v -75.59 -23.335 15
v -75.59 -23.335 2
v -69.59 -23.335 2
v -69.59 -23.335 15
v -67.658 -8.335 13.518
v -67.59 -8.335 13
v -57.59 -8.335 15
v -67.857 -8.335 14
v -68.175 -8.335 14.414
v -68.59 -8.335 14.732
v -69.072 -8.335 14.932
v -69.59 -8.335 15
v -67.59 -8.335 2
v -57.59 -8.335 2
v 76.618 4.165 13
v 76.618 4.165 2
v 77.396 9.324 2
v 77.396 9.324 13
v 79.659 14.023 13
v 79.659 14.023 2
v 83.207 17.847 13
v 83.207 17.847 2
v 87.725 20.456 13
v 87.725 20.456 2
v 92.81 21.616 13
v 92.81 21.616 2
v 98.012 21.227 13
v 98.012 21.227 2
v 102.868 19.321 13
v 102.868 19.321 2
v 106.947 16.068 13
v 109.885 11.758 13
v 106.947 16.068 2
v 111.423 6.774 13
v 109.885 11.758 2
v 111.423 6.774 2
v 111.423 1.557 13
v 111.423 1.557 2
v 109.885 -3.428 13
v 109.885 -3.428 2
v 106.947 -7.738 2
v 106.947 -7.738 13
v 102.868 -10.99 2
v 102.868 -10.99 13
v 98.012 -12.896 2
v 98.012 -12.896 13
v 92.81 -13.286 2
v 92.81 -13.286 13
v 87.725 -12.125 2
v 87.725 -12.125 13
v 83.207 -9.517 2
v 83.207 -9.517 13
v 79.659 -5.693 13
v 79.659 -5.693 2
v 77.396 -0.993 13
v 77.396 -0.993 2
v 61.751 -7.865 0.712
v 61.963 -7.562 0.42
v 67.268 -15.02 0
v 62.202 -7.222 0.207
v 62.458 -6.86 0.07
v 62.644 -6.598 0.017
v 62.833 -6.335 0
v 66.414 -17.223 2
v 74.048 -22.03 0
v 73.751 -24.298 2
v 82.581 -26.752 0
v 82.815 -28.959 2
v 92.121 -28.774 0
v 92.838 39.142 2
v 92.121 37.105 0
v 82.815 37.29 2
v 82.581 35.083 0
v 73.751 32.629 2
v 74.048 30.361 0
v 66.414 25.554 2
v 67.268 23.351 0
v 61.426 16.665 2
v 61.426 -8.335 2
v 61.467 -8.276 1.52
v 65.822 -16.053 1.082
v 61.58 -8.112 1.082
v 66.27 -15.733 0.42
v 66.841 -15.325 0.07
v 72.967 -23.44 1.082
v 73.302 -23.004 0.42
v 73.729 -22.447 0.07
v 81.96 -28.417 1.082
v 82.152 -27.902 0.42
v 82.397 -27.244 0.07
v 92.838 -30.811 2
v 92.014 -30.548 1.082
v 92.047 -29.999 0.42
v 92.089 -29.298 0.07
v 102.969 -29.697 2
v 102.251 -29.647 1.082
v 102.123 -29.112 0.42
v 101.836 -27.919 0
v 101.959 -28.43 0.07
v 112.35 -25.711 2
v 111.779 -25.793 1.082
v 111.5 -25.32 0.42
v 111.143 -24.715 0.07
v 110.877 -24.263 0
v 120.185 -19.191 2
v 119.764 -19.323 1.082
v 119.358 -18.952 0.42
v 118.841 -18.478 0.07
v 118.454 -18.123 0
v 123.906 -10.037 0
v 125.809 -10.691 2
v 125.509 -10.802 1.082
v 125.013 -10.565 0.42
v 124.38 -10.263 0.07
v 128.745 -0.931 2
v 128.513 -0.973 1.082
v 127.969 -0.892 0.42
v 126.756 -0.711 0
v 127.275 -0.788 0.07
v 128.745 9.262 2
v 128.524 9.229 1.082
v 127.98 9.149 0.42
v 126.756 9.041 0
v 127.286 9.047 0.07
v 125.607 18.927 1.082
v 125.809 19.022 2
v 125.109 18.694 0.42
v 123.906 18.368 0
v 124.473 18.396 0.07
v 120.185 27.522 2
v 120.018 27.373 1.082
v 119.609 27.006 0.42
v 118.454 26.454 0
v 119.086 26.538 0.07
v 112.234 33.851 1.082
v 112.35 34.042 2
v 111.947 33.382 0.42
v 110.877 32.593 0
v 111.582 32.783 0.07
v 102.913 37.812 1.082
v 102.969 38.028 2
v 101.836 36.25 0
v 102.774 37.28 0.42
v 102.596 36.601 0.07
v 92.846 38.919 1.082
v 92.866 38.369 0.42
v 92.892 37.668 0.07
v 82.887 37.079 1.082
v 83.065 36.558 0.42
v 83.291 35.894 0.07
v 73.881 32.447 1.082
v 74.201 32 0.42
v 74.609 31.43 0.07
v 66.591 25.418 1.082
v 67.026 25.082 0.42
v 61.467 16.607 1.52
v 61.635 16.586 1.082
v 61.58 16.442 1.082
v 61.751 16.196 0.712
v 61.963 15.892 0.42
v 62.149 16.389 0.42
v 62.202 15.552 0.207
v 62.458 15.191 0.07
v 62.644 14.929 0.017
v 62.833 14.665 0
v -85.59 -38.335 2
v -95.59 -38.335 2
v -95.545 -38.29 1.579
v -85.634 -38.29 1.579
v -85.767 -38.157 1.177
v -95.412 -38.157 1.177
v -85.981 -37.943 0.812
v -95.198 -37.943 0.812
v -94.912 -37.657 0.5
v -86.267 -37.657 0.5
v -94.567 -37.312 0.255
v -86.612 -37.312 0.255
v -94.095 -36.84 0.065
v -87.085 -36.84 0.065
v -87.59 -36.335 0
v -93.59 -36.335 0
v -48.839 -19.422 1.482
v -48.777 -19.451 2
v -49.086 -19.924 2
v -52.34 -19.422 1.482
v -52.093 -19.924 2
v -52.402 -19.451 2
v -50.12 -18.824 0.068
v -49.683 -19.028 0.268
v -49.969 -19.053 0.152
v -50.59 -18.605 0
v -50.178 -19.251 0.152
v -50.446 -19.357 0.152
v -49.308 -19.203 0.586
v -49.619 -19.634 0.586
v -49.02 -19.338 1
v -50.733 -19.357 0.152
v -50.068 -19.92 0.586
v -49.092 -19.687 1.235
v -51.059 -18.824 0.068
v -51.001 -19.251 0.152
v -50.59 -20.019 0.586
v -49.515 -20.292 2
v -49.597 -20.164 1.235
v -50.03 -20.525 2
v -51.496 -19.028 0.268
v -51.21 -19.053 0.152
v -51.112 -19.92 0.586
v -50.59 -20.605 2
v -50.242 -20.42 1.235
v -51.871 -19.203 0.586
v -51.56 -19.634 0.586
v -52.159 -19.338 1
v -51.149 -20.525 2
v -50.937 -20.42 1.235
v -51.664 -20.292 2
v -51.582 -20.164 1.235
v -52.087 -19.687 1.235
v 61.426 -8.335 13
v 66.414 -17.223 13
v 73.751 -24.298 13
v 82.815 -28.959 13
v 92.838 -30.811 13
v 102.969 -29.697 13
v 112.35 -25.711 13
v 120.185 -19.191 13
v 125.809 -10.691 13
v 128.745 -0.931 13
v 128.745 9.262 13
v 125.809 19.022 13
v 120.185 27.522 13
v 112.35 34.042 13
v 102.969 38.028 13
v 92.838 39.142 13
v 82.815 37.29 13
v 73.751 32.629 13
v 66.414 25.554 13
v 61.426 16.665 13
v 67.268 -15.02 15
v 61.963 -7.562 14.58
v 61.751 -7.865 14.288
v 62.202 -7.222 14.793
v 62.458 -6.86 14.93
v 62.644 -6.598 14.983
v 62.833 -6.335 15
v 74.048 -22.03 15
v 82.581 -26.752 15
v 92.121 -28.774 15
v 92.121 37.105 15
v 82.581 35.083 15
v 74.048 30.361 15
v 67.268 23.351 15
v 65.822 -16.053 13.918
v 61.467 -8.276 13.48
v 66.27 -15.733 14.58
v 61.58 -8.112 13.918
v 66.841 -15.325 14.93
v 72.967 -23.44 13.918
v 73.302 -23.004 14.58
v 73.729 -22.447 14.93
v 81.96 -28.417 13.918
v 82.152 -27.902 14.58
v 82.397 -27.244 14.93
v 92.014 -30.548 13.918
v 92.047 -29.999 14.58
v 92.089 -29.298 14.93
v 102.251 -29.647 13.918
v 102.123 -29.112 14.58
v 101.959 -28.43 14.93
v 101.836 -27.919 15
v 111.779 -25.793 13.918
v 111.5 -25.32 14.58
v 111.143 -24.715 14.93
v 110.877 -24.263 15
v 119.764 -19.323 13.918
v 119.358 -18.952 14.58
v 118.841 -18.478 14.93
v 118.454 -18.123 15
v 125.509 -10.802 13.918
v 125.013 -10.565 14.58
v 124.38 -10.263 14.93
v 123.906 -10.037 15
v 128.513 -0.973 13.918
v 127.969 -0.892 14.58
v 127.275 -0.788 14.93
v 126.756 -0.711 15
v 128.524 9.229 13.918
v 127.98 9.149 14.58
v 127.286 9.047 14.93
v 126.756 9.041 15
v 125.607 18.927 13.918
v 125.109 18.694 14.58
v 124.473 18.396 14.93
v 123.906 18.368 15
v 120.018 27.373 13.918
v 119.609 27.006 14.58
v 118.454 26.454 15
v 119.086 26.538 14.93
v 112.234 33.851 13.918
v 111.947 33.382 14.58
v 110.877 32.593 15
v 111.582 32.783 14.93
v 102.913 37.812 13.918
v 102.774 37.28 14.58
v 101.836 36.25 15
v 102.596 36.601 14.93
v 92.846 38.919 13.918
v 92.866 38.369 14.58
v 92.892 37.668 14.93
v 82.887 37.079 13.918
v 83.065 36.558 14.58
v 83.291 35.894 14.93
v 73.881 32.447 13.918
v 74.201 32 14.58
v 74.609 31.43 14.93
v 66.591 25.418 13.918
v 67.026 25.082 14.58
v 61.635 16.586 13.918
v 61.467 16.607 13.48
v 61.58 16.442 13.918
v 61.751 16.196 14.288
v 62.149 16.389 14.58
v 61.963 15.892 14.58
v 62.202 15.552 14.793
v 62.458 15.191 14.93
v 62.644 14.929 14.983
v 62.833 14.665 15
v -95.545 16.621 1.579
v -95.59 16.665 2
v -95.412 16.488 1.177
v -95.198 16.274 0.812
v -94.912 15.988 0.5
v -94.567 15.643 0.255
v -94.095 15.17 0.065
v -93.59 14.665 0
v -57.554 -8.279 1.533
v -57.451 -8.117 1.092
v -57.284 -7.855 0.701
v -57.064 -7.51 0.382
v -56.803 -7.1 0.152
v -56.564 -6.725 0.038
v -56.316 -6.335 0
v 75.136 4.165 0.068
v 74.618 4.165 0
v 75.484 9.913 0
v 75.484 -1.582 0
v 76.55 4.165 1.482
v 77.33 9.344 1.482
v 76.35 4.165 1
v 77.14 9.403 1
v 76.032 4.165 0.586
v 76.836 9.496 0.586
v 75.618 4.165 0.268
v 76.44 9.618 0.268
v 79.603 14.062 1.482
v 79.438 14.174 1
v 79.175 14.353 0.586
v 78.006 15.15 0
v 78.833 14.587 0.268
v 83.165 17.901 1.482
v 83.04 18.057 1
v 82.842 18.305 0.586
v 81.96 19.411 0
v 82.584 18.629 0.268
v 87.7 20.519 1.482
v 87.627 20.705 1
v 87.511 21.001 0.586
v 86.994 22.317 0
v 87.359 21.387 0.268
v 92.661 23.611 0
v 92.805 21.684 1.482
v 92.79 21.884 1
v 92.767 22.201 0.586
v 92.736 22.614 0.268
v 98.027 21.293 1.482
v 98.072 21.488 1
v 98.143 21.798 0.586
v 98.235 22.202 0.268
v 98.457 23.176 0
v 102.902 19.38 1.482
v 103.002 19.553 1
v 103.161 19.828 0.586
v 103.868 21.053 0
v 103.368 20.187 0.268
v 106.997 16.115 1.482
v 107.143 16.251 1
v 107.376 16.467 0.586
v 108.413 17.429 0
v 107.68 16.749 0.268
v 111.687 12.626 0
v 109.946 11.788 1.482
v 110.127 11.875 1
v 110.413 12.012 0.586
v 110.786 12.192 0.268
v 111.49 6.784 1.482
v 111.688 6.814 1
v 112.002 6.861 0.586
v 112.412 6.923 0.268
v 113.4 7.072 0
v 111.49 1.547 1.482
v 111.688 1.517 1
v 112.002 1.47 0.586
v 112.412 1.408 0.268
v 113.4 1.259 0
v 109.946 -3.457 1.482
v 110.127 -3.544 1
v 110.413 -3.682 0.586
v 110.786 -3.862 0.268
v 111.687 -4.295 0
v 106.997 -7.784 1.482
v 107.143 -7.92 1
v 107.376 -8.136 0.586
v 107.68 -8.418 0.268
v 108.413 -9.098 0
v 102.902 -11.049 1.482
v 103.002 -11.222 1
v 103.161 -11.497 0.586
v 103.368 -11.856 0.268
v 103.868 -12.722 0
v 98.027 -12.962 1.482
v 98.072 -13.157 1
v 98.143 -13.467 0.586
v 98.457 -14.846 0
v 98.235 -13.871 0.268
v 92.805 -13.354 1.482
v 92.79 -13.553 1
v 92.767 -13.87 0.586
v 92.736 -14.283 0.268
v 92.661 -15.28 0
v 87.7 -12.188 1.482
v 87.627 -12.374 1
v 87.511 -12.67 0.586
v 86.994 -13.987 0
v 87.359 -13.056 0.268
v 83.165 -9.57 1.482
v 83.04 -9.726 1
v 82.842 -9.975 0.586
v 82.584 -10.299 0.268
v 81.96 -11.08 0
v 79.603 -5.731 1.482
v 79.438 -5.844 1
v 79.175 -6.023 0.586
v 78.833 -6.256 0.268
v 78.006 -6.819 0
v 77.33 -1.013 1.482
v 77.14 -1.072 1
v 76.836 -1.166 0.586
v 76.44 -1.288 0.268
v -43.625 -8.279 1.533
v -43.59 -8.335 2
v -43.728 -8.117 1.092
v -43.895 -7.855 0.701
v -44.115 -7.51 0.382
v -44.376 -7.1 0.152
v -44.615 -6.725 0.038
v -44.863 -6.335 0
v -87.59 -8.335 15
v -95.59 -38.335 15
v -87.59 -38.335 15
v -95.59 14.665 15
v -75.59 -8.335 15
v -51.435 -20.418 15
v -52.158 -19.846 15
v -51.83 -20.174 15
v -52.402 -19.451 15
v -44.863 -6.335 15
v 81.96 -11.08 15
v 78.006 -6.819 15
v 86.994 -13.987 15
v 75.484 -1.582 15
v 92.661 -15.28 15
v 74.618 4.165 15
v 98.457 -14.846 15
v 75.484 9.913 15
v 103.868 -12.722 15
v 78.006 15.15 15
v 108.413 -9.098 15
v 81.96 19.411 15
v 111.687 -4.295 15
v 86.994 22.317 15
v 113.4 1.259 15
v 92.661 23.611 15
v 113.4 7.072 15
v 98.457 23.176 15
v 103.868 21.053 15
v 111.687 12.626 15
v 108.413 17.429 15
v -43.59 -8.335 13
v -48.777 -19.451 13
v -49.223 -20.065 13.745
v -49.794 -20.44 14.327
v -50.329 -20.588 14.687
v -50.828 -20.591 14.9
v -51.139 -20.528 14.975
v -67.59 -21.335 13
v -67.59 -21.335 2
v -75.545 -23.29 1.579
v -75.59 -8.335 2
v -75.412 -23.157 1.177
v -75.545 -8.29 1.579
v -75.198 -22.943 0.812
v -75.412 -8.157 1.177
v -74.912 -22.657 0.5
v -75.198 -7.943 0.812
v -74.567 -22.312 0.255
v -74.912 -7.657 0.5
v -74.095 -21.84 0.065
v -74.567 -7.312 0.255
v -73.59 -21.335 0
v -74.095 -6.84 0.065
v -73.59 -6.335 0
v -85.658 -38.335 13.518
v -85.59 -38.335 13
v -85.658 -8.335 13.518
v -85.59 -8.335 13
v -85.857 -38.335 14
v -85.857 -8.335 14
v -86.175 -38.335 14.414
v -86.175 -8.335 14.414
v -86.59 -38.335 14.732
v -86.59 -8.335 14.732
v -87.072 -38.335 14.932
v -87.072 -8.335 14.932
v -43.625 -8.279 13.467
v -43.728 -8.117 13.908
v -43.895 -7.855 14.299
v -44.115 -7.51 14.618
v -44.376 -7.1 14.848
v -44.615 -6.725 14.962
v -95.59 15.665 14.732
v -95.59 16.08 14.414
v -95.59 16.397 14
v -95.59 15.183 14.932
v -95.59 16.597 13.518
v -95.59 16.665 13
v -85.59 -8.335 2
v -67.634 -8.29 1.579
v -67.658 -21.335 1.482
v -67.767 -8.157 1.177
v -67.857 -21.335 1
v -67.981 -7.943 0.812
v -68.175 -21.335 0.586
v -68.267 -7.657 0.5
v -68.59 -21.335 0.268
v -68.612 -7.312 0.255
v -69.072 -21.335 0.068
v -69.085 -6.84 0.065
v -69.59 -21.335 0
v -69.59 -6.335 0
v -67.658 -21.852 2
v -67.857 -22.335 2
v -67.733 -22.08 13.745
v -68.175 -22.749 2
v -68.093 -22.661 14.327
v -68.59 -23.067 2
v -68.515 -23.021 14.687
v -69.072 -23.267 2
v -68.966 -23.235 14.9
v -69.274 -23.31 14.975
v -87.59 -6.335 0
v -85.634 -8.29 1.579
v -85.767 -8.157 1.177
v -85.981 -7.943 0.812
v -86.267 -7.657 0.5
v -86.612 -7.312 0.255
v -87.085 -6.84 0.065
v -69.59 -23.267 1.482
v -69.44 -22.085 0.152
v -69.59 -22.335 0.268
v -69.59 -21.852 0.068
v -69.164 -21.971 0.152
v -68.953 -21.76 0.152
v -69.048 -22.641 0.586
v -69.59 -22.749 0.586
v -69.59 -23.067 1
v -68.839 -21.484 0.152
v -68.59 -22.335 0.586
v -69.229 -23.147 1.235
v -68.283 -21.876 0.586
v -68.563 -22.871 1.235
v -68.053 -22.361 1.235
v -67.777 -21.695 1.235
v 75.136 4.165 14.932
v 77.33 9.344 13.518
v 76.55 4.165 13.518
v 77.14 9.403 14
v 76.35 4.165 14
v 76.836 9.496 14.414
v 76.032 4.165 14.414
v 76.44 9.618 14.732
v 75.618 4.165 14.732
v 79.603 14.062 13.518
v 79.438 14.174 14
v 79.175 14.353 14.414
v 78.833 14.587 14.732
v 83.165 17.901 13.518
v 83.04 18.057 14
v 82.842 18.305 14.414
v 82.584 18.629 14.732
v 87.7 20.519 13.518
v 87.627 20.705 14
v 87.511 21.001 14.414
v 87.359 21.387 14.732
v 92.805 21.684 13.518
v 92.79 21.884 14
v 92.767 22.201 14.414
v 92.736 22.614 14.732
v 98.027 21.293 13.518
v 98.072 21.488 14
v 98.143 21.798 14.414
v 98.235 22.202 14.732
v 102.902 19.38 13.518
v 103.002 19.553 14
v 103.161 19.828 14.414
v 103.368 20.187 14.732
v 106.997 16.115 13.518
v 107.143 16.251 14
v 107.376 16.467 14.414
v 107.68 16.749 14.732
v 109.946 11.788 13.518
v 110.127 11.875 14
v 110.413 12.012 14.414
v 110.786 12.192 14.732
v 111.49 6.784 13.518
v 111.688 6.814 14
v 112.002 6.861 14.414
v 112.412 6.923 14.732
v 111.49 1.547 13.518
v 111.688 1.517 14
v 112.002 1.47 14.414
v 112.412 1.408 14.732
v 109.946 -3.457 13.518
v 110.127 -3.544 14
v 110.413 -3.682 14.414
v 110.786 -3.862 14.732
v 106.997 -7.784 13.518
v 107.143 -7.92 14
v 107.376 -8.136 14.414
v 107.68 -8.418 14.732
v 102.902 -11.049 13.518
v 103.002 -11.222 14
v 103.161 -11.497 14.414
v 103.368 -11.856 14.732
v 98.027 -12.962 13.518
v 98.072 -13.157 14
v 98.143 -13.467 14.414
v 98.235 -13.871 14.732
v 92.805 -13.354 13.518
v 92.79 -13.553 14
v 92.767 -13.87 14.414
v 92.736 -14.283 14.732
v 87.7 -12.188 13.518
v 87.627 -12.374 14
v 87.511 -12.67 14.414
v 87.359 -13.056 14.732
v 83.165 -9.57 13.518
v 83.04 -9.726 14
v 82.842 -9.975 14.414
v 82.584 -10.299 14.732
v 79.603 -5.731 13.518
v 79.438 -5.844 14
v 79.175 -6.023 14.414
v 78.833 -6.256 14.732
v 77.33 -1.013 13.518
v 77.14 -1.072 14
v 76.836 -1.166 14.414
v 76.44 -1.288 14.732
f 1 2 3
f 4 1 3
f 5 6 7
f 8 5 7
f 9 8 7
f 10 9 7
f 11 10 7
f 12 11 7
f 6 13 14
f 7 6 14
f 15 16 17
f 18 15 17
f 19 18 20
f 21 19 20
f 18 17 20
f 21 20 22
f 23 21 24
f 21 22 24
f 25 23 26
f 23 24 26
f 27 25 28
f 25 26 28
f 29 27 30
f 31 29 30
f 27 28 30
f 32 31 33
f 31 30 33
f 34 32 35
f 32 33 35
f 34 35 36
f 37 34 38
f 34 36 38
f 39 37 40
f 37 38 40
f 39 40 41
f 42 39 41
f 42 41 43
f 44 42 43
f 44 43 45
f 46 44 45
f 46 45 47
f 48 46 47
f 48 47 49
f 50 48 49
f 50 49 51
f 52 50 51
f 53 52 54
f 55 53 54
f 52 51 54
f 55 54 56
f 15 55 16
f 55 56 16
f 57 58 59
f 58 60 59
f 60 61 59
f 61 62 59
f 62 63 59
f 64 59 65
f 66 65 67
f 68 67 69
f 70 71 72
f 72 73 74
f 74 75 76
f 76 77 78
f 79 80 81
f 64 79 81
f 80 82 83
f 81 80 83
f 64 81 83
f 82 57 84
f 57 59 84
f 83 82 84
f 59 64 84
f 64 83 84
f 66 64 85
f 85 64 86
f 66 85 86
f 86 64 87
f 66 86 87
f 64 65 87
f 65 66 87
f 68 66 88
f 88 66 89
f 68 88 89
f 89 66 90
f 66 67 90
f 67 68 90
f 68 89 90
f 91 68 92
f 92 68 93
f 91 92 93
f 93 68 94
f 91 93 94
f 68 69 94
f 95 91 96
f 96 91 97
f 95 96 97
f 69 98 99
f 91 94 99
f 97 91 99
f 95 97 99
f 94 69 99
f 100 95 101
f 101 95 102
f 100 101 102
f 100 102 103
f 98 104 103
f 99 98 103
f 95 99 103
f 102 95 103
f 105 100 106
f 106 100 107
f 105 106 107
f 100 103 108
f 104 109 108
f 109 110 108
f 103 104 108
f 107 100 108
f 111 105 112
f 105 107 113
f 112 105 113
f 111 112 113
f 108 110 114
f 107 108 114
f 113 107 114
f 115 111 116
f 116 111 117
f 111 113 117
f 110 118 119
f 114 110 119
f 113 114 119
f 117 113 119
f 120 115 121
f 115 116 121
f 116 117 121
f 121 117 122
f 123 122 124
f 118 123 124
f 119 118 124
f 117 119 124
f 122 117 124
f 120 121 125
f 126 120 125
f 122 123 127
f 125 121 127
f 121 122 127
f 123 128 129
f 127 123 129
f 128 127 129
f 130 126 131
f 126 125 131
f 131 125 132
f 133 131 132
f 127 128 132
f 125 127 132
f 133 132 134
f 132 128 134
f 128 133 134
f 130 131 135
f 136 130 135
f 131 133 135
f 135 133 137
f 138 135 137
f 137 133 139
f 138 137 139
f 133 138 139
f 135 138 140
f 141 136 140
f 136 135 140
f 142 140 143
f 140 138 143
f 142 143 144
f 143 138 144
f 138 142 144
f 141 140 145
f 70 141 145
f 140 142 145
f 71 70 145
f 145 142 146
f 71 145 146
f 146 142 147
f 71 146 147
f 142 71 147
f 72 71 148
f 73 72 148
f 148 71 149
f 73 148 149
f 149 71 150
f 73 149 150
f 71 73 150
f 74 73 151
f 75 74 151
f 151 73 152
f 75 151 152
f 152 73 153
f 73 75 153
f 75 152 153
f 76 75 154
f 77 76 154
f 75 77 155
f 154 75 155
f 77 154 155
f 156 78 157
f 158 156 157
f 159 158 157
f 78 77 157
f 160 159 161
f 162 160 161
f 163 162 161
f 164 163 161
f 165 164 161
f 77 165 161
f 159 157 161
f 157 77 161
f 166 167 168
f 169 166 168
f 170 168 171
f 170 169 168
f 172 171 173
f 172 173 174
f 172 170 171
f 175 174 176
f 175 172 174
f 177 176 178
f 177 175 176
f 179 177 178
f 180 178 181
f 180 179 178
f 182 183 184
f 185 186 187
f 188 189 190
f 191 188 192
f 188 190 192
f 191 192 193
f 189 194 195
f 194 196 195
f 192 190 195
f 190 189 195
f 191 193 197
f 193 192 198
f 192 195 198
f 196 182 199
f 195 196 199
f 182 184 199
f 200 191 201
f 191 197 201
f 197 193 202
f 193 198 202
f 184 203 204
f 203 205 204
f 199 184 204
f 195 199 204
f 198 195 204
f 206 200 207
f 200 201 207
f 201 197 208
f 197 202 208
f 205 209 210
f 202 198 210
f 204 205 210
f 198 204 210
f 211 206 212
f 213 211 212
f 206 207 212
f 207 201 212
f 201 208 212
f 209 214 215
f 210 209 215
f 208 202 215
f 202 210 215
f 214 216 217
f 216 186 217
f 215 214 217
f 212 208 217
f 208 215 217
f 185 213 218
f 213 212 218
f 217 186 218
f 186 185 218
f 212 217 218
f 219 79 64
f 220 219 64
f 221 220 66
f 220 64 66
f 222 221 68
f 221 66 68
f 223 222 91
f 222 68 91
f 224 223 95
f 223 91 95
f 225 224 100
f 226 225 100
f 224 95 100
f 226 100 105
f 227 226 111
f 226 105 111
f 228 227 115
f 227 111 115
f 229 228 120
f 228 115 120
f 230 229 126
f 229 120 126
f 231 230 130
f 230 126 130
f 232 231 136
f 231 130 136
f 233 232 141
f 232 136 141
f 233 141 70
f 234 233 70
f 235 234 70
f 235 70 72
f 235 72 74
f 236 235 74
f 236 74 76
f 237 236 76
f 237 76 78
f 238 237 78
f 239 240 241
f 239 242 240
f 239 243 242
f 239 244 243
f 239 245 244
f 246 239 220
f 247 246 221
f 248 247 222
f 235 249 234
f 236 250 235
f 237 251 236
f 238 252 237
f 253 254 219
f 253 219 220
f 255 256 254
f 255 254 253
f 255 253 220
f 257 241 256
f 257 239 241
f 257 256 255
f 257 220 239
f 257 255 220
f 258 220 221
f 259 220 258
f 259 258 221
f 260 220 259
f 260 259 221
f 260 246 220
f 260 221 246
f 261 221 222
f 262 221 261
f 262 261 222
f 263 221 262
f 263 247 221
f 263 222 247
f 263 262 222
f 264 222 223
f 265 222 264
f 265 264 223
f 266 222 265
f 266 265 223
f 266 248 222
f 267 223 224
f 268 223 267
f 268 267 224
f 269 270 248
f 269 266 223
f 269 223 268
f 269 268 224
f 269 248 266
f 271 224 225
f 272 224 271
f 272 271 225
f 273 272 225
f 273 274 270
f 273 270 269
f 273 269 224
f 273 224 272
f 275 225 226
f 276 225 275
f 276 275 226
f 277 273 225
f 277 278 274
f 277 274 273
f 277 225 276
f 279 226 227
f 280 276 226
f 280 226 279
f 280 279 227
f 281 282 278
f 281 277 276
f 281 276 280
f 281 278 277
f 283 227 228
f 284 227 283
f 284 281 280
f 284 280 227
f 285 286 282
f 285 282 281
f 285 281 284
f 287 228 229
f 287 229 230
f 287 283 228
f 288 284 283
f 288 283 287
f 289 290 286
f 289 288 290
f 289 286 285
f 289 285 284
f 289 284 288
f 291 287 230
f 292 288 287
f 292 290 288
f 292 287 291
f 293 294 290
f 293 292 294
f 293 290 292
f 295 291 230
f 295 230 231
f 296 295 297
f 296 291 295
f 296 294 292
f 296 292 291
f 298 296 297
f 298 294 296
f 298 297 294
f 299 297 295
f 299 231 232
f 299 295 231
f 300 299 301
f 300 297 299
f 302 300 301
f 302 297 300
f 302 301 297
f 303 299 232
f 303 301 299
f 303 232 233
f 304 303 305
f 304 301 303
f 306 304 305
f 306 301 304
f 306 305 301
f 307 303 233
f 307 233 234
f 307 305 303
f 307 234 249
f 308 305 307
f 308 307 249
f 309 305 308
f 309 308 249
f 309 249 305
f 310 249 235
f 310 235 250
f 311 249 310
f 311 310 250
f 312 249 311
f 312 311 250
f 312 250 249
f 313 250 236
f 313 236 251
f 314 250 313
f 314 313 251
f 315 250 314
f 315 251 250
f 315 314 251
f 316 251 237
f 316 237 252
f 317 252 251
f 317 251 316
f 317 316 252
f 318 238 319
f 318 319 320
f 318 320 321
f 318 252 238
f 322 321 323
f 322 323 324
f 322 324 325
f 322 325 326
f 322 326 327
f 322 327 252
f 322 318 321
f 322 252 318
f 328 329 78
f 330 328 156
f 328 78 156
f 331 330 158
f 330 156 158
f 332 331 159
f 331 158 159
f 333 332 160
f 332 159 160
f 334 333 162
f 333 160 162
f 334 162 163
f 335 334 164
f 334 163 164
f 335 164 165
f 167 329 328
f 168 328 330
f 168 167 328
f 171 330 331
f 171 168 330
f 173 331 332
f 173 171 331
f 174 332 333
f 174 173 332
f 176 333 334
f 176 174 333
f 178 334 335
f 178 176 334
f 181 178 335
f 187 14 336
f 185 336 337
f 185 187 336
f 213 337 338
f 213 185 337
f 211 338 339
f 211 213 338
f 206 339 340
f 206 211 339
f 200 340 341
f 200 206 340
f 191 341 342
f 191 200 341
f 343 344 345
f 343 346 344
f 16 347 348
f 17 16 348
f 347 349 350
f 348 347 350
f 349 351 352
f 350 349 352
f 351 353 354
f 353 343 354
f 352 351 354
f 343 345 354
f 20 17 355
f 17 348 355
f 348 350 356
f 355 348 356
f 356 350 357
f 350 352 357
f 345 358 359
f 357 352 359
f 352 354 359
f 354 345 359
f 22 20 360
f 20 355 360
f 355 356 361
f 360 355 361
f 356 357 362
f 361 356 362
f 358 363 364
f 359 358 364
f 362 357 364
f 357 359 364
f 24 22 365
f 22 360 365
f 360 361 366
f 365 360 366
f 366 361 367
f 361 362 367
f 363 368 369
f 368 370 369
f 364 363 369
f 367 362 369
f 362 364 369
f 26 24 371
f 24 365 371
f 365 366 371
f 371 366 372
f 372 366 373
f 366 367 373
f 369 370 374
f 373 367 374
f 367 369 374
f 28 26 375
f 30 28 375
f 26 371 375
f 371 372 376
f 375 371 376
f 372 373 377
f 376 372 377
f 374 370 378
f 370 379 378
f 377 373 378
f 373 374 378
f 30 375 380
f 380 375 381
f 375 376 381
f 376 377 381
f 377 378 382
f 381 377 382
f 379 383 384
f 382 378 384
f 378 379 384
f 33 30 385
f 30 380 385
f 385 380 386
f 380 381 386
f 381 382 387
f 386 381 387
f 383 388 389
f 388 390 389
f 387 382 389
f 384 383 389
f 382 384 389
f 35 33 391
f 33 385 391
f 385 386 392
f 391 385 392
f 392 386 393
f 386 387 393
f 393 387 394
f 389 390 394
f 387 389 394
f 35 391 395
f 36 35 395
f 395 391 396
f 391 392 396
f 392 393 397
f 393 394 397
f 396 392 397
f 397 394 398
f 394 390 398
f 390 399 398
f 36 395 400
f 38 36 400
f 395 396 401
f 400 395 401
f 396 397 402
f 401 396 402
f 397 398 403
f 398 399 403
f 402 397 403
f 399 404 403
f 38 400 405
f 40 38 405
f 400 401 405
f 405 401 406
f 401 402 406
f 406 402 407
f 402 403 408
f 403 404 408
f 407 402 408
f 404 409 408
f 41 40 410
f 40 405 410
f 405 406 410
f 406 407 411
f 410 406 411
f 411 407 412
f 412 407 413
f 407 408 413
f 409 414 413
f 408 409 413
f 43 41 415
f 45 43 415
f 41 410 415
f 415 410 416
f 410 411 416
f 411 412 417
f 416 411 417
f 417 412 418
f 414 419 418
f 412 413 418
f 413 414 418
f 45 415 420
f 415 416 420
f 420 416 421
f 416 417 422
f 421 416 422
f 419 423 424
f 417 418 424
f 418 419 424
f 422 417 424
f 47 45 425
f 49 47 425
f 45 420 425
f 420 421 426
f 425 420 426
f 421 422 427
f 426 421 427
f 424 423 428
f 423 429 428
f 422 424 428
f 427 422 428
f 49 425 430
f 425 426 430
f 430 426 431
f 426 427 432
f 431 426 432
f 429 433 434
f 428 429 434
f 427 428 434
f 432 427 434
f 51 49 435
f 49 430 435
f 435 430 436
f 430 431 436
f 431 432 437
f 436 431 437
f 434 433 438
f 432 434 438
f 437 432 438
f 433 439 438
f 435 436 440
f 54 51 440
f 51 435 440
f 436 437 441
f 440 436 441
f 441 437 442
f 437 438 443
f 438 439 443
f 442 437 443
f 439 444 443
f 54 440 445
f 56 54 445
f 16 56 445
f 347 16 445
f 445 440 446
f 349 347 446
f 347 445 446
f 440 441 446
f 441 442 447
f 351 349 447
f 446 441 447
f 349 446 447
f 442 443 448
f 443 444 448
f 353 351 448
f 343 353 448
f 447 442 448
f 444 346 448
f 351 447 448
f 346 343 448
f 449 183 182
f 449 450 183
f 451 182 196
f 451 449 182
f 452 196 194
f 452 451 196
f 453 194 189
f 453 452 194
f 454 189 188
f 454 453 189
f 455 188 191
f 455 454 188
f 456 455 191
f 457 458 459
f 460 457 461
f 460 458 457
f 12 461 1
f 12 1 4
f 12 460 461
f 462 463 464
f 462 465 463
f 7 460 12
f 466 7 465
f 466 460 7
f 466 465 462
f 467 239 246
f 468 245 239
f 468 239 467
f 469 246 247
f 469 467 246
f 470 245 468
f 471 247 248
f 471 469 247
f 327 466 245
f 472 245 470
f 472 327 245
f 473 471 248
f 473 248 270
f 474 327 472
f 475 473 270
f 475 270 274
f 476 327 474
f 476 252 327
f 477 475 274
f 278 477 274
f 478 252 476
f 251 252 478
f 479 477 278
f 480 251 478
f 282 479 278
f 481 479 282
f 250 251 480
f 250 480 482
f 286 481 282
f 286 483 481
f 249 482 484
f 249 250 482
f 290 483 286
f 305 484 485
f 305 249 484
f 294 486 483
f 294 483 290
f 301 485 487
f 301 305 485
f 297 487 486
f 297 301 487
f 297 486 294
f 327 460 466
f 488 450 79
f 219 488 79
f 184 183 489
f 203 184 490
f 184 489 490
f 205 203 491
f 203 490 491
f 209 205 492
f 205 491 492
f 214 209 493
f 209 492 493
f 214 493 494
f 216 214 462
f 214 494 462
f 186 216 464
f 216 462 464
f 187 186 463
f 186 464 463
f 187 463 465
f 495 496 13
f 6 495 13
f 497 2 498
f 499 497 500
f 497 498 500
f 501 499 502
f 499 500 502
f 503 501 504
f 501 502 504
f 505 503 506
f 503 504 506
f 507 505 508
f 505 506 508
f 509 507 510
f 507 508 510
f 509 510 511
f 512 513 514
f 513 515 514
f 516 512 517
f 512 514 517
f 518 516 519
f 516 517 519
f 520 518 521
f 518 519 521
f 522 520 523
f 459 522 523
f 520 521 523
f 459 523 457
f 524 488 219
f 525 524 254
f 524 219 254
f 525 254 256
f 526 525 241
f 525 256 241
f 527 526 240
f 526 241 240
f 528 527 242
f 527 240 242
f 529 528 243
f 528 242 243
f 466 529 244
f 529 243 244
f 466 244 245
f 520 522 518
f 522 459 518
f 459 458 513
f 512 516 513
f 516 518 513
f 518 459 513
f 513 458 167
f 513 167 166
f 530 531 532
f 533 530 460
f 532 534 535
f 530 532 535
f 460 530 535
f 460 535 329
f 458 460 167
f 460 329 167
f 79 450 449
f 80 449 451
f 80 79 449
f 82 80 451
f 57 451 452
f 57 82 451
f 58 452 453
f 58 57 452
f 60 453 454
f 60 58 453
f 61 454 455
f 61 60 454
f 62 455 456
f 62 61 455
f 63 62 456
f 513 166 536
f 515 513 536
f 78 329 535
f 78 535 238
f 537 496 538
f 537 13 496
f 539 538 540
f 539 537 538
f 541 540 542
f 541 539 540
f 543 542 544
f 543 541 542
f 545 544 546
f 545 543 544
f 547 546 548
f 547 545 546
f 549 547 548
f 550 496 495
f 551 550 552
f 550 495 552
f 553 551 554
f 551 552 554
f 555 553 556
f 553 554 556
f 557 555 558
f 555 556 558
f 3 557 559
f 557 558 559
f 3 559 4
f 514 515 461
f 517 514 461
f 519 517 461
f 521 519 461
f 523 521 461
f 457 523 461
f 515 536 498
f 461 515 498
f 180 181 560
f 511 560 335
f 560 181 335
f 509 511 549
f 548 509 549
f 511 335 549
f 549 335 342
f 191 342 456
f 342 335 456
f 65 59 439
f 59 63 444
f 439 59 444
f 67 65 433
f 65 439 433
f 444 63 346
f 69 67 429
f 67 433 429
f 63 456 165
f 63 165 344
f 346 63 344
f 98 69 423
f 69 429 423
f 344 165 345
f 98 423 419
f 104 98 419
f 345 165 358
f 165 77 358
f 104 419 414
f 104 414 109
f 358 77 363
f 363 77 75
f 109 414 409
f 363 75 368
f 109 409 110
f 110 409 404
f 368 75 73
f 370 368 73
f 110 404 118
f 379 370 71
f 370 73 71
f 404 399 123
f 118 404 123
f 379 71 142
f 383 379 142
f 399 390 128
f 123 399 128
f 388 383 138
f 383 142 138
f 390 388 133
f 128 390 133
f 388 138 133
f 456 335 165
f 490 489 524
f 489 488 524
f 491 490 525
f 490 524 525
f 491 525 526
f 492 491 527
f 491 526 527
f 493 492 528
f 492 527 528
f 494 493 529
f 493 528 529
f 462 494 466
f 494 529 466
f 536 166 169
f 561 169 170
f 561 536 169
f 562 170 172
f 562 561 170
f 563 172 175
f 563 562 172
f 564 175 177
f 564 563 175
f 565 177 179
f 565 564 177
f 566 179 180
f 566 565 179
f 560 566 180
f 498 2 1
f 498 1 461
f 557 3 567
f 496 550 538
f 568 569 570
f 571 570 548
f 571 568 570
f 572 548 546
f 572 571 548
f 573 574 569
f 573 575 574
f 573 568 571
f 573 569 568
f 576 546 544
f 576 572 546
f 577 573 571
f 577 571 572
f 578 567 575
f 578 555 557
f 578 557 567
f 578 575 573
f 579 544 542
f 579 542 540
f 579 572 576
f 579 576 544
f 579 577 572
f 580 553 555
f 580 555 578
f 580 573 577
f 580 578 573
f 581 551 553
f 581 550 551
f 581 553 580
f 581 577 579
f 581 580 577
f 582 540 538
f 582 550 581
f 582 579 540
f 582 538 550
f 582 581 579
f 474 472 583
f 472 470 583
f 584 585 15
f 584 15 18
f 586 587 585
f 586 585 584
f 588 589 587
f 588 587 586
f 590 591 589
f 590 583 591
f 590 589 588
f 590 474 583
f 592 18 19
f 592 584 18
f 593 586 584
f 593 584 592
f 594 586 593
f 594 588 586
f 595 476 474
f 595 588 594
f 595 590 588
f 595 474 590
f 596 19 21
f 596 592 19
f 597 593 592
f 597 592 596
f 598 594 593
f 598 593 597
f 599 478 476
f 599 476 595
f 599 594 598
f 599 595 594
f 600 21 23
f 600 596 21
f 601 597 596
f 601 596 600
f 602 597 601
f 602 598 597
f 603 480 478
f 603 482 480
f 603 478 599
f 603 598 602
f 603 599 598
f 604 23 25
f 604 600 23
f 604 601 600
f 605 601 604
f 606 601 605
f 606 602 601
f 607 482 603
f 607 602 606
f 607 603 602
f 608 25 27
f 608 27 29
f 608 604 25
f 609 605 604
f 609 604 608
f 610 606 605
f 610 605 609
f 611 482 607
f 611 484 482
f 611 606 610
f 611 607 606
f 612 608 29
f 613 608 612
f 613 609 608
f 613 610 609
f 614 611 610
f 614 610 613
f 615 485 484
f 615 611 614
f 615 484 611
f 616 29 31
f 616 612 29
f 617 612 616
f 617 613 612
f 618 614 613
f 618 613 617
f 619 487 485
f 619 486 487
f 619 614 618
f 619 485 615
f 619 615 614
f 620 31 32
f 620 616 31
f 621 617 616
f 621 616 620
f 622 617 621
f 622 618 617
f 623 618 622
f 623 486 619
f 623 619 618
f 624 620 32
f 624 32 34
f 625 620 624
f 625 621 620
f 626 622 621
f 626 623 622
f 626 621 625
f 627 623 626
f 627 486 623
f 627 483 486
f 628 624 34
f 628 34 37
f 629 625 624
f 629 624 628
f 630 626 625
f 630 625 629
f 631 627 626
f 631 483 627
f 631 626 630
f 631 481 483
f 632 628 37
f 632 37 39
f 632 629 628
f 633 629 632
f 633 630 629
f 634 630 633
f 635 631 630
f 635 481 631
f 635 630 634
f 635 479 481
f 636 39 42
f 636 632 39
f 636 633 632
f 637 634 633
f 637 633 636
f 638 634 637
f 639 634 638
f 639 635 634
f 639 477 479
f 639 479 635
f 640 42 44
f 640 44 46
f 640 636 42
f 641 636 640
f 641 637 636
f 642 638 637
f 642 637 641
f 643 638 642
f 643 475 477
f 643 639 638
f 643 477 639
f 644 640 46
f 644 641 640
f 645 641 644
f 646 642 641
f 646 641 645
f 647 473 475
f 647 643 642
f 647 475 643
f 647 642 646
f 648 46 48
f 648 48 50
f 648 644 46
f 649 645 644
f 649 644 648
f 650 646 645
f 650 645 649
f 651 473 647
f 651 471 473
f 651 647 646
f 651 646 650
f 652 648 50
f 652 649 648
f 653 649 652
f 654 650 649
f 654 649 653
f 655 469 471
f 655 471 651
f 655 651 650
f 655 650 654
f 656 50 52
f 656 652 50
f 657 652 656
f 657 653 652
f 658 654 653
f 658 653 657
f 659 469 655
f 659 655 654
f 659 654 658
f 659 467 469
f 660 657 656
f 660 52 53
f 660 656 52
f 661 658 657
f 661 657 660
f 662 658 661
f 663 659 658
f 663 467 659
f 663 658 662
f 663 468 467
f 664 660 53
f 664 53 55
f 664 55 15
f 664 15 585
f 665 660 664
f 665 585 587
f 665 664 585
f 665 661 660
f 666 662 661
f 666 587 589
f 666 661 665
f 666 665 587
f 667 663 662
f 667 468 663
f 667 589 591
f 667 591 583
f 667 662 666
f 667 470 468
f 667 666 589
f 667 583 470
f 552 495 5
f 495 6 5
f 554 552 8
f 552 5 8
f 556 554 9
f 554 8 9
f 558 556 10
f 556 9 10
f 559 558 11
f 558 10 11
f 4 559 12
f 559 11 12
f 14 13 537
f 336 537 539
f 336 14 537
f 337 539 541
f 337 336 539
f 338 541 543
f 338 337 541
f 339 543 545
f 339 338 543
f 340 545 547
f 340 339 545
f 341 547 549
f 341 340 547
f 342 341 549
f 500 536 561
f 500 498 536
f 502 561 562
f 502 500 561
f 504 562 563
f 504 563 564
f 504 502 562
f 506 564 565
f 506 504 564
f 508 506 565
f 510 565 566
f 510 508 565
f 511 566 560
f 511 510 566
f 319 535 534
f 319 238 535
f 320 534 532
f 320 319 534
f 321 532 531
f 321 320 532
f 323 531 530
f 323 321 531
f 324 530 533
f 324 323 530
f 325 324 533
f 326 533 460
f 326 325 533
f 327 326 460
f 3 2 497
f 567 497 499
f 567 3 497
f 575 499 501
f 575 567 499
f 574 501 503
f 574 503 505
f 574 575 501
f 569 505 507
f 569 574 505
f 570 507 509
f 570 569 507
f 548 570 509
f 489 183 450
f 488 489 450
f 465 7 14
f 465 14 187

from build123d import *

# Parameters (mm, degrees)
F0_W     = 10
F0_H     = 30
F0_W_2   = 8
F0_H_2   = 15
F0_W_3   = 157.0159420669
F0_H_3   = 12.5
F1_DEPTH = 15
F2_R     = 2


with BuildPart() as f1:
    # F0 (on Top) → F1 (new body)
    with BuildSketch(Plane.XY):
        Polygon((-50.5895421207, -23.3346595988), (-43.5895421207, -8.3346595988), (-57.5895421207, -8.3346595988), align=None)
        with Locations((-90.5895421207, -23.3346595988)):
            Rectangle(F0_W, F0_H)
        with Locations((-71.5895421207, -15.8346595988)):
            Rectangle(F0_W_2, F0_H_2)
        with Locations((-17.0815710872, 10.4153404012)):
            Rectangle(F0_W_3, F0_H_3)
        Polygon((61.4263999462, 4.1653404012), (-95.5895421207, 4.1653404012), (-95.5895421207, -8.3346595988), (-85.5895421207, -8.3346595988), (-75.5895421207, -8.3346595988), (-67.5895421207, -8.3346595988), (-57.5895421207, -8.3346595988), (-43.5895421207, -8.3346595988), (61.4263999462, -8.3346595988), align=None)
        with BuildLine():
            ThreePointArc((61.4263999462, -8.3346595988), (129.1181420228, 4.1653404012), (61.4263999462, 16.6653404012))
            Line((61.4263999462, 16.6653404012), (61.4263999462, 4.1653404012))
            Line((61.4263999462, 4.1653404012), (61.4263999462, -8.3346595988))
        make_face()
        with BuildLine():
            ThreePointArc((111.6181420228, 4.1653404012), (94.1181420228, -13.3346595988), (76.6181420228, 4.1653404012))
            ThreePointArc((76.6181420228, 4.1653404012), (94.1181420228, 21.6653404012), (111.6181420228, 4.1653404012))
        make_face(mode=Mode.SUBTRACT)
    extrude(amount=F1_DEPTH)

    # F2
    f2_edges = [f1.edges().sort_by_distance(p)[0] for p in [
        (129.118142, 4.16534, 15),
        (-17.081571, 16.66534, 15),
        (-47.089542, -15.83466, 15),
        (-67.589542, -15.83466, 15),
        (-85.589542, -23.33466, 15),
        (111.618142, 4.16534, 0),
        (111.618142, 4.16534, 15),
        (129.118142, 4.16534, 0),
        (8.918429, -8.33466, 0),
        (-17.081571, 16.66534, 0),
        (-54.089542, -15.83466, 0),
        (-50.589542, -23.33466, 7.5),
        (-67.589542, -23.33466, 7.5),
        (-71.589542, -23.33466, 0),
        (-75.589542, -15.83466, 0),
        (-85.589542, -23.33466, 0),
        (-95.589542, -10.83466, 0),
        (-47.089542, -15.83466, 0),
        (-90.589542, -38.33466, 0),
        (-80.589542, -8.33466, 0),
        (-67.589542, -15.83466, 0),
        (-62.589542, -8.33466, 0),
        (8.918429, -8.33466, 15),
    ]]
    fillet(f2_edges, radius=F2_R)


solid = f1.part
